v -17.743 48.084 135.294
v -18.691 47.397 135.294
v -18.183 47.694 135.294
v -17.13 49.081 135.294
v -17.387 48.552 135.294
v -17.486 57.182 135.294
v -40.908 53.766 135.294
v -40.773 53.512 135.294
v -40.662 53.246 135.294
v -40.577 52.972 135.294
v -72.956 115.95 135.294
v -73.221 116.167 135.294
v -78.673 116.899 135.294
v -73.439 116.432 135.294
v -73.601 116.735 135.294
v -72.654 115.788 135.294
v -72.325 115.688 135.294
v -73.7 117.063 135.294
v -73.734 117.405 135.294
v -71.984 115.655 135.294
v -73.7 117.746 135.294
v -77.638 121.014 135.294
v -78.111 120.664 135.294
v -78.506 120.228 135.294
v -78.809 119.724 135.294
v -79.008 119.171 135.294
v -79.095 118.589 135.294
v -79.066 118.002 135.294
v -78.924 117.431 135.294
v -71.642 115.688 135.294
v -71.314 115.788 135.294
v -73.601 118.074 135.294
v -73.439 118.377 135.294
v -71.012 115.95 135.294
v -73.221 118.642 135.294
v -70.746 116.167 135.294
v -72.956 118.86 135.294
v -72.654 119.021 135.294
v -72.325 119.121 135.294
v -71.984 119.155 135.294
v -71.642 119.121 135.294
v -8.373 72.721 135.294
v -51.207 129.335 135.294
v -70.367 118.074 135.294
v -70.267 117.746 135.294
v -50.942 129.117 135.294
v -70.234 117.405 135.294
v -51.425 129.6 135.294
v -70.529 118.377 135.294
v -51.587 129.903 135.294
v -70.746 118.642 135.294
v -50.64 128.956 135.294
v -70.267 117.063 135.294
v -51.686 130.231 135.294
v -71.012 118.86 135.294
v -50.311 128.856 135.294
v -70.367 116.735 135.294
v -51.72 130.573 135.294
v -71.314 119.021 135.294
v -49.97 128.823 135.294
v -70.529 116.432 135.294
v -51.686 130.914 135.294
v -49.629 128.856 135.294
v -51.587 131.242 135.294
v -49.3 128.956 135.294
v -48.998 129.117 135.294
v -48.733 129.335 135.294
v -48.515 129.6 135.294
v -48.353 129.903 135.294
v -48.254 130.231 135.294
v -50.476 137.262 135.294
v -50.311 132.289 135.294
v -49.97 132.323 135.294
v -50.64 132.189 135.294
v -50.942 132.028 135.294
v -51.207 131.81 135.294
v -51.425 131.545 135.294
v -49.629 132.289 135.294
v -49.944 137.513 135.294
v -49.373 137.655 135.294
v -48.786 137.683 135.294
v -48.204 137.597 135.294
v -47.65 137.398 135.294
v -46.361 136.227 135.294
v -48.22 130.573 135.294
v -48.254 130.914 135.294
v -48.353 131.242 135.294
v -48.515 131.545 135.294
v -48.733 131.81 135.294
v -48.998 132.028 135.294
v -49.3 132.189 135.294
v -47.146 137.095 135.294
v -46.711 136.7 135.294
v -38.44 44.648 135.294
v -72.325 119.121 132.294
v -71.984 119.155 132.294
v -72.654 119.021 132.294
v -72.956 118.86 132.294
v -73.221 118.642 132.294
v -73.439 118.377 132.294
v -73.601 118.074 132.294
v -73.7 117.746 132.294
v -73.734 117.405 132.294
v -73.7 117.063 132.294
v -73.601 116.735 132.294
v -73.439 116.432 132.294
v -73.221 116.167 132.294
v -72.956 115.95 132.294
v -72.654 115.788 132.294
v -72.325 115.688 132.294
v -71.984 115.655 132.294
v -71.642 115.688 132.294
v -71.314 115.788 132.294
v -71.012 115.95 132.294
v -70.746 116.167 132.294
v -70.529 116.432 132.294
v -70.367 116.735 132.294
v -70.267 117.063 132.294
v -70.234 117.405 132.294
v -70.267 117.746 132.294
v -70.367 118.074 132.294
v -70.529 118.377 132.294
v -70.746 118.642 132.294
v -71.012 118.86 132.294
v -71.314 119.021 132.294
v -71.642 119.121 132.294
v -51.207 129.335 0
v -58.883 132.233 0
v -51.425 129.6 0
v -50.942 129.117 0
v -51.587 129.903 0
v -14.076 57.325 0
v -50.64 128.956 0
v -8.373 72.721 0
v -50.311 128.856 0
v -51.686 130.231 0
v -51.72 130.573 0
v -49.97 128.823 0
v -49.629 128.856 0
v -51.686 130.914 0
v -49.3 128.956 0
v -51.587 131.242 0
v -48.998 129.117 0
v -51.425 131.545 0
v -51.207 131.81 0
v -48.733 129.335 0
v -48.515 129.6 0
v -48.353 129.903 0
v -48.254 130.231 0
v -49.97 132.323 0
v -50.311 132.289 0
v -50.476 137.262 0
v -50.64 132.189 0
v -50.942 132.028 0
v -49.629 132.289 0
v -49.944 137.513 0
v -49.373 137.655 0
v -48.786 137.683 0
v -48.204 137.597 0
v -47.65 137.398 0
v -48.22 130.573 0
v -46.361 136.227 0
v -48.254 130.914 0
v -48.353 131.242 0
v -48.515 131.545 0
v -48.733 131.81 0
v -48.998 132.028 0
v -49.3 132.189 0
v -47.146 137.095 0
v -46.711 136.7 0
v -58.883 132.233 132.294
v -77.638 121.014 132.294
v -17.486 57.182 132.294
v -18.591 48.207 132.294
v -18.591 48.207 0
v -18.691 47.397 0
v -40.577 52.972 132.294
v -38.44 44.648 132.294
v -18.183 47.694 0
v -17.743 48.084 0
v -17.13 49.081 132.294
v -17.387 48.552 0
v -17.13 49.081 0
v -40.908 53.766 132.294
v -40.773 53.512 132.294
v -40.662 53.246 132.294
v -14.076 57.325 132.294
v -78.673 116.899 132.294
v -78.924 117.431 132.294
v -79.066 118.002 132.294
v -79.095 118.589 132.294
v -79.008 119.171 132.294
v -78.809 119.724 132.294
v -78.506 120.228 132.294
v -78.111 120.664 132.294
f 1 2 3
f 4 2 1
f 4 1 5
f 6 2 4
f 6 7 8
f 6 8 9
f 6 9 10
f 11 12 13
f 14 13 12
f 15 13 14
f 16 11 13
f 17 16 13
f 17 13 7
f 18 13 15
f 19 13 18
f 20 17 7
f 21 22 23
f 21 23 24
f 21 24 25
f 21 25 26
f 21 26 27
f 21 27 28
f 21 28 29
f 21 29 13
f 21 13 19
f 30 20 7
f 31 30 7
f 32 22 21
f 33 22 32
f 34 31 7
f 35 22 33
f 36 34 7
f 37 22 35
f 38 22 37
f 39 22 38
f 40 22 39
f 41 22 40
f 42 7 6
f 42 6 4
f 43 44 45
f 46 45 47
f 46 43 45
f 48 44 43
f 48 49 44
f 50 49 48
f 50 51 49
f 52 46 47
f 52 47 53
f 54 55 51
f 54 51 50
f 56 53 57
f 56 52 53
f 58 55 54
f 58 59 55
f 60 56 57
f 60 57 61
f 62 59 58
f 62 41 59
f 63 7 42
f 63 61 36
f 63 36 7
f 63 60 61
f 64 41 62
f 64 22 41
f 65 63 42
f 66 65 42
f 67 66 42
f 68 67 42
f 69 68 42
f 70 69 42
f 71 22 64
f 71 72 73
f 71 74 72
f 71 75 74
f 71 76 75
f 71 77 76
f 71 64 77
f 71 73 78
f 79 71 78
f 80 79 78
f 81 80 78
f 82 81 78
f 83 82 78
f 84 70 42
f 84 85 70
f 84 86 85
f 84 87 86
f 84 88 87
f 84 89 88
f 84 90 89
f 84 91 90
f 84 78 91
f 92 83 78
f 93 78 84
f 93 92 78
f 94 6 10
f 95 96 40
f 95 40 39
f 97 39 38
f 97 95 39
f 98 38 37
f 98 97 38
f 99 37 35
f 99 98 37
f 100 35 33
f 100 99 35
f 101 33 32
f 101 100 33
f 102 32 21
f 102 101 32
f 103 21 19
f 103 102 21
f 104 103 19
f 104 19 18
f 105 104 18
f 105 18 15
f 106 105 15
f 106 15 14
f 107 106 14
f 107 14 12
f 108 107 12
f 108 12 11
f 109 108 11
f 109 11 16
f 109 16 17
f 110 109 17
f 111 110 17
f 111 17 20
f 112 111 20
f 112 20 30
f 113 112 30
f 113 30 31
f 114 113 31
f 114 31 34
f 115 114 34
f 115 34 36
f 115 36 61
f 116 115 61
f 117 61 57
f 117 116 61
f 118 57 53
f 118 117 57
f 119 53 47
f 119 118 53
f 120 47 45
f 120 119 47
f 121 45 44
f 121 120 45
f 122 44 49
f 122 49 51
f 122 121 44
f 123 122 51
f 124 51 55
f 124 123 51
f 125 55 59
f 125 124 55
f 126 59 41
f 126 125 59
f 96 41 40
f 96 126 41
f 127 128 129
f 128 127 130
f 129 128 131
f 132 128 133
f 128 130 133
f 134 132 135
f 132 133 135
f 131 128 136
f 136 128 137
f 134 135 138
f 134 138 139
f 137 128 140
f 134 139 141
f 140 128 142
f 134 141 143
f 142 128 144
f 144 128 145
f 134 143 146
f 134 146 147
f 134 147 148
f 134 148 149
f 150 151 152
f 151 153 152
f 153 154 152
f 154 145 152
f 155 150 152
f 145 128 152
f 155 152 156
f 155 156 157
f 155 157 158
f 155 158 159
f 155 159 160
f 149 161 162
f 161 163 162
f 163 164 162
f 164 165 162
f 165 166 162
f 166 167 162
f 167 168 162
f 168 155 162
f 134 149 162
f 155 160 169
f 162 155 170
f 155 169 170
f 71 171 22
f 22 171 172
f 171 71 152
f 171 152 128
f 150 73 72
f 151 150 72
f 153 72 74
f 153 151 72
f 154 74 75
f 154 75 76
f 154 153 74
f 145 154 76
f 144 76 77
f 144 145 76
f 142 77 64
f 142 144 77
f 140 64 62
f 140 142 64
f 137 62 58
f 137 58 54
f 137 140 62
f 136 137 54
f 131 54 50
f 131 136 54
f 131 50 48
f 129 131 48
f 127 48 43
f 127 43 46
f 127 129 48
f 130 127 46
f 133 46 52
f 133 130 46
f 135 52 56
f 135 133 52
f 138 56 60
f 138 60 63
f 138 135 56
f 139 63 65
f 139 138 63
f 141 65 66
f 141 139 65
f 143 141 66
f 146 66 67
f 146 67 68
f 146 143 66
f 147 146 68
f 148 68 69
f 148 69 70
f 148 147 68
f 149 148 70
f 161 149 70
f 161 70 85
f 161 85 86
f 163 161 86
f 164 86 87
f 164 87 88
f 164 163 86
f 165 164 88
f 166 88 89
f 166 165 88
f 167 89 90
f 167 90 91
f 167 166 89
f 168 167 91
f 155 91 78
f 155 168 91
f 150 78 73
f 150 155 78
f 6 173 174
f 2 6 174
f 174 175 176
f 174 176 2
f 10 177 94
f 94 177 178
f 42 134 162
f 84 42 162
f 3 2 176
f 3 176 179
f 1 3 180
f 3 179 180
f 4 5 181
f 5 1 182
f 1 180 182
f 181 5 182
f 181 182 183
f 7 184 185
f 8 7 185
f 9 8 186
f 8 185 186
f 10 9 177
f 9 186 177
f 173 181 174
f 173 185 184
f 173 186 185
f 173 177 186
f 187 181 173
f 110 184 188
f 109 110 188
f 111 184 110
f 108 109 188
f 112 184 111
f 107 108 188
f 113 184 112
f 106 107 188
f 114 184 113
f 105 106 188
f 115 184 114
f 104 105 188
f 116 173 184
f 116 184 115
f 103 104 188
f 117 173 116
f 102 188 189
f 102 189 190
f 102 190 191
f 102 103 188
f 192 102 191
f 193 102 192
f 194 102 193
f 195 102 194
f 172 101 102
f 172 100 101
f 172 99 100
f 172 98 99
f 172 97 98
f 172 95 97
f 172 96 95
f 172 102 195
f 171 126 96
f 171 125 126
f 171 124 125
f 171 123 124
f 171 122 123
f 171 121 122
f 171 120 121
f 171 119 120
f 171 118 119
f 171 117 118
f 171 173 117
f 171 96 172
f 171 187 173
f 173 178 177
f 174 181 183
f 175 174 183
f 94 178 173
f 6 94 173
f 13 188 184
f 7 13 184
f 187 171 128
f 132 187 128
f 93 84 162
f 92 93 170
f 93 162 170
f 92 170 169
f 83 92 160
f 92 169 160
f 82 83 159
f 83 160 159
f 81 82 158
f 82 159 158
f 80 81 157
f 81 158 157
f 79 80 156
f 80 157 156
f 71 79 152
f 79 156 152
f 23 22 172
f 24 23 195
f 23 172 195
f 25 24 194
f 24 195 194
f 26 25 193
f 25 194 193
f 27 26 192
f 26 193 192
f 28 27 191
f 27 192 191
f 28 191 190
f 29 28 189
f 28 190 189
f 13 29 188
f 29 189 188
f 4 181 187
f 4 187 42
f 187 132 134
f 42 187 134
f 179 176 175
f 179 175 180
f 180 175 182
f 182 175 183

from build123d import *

# Parameters (mm, degrees)
SKETCH_1_R          = 1.75
EXTRUDE_1_DEPTH     = 135.293792798
SKETCH_3_W          = 133.999999999
SKETCH_3_H          = 92.793140679
CUT_EXTRUDE_1_DEPTH = 210.099404157


with BuildPart() as part:
    # 草图1 → 凸台-拉伸1 (new body)
    with BuildSketch(Plane.XY):
        with BuildLine():
            Line((-17.129972102, 49.08105856), (-8.373318144, 72.720547785))
            Line((-8.373318144, 72.720547785), (-46.360961782, 136.227129066))
            ThreePointArc((-46.360961782, 136.227129066), (-48.203989789, 137.596554385), (-50.47553732, 137.261666712))
            Line((-50.47553732, 137.261666712), (-77.638405872, 121.013691307))
            ThreePointArc((-77.638405872, 121.013691307), (-79.007831191, 119.1706633), (-78.672943518, 116.899115769))
            Line((-78.672943518, 116.899115769), (-40.908434768, 53.765564573))
            ThreePointArc((-40.908434768, 53.765564573), (-40.714211977, 53.380474511), (-40.57721581, 52.971513757))
            Line((-40.57721581, 52.971513757), (-38.440433205, 44.648087586))
            Line((-38.440433205, 44.648087586), (-17.486445488, 57.181732929))
            Line((-17.486445488, 57.181732929), (-18.690847722, 47.397023253))
            ThreePointArc((-18.690847722, 47.397023253), (-17.742918238, 48.083798514), (-17.129972102, 49.08105856))
        make_face()
        with Locations(Location((-71.983811388, 117.404597068, 0), (0, 0, 90))):
            Circle(SKETCH_1_R, mode=Mode.SUBTRACT)
        with Locations(Location((-49.970056021, 130.572534582, 0), (0, 0, 90))):
            Circle(SKETCH_1_R, mode=Mode.SUBTRACT)
    extrude(amount=EXTRUDE_1_DEPTH)

    # 草图3 → 切除-拉伸1 (cut, through all)
    with BuildSketch(Plane(origin=(14.886439913, 8.904336531, 0), x_dir=(0, 0, -1), z_dir=(0.8581922502722595, 0.5133284149281387, 0))):
        with Locations((-65.293792798, 97.310855858)):
            Rectangle(SKETCH_3_W, SKETCH_3_H)
    extrude(amount=-CUT_EXTRUDE_1_DEPTH, mode=Mode.SUBTRACT)


solid = part.part
